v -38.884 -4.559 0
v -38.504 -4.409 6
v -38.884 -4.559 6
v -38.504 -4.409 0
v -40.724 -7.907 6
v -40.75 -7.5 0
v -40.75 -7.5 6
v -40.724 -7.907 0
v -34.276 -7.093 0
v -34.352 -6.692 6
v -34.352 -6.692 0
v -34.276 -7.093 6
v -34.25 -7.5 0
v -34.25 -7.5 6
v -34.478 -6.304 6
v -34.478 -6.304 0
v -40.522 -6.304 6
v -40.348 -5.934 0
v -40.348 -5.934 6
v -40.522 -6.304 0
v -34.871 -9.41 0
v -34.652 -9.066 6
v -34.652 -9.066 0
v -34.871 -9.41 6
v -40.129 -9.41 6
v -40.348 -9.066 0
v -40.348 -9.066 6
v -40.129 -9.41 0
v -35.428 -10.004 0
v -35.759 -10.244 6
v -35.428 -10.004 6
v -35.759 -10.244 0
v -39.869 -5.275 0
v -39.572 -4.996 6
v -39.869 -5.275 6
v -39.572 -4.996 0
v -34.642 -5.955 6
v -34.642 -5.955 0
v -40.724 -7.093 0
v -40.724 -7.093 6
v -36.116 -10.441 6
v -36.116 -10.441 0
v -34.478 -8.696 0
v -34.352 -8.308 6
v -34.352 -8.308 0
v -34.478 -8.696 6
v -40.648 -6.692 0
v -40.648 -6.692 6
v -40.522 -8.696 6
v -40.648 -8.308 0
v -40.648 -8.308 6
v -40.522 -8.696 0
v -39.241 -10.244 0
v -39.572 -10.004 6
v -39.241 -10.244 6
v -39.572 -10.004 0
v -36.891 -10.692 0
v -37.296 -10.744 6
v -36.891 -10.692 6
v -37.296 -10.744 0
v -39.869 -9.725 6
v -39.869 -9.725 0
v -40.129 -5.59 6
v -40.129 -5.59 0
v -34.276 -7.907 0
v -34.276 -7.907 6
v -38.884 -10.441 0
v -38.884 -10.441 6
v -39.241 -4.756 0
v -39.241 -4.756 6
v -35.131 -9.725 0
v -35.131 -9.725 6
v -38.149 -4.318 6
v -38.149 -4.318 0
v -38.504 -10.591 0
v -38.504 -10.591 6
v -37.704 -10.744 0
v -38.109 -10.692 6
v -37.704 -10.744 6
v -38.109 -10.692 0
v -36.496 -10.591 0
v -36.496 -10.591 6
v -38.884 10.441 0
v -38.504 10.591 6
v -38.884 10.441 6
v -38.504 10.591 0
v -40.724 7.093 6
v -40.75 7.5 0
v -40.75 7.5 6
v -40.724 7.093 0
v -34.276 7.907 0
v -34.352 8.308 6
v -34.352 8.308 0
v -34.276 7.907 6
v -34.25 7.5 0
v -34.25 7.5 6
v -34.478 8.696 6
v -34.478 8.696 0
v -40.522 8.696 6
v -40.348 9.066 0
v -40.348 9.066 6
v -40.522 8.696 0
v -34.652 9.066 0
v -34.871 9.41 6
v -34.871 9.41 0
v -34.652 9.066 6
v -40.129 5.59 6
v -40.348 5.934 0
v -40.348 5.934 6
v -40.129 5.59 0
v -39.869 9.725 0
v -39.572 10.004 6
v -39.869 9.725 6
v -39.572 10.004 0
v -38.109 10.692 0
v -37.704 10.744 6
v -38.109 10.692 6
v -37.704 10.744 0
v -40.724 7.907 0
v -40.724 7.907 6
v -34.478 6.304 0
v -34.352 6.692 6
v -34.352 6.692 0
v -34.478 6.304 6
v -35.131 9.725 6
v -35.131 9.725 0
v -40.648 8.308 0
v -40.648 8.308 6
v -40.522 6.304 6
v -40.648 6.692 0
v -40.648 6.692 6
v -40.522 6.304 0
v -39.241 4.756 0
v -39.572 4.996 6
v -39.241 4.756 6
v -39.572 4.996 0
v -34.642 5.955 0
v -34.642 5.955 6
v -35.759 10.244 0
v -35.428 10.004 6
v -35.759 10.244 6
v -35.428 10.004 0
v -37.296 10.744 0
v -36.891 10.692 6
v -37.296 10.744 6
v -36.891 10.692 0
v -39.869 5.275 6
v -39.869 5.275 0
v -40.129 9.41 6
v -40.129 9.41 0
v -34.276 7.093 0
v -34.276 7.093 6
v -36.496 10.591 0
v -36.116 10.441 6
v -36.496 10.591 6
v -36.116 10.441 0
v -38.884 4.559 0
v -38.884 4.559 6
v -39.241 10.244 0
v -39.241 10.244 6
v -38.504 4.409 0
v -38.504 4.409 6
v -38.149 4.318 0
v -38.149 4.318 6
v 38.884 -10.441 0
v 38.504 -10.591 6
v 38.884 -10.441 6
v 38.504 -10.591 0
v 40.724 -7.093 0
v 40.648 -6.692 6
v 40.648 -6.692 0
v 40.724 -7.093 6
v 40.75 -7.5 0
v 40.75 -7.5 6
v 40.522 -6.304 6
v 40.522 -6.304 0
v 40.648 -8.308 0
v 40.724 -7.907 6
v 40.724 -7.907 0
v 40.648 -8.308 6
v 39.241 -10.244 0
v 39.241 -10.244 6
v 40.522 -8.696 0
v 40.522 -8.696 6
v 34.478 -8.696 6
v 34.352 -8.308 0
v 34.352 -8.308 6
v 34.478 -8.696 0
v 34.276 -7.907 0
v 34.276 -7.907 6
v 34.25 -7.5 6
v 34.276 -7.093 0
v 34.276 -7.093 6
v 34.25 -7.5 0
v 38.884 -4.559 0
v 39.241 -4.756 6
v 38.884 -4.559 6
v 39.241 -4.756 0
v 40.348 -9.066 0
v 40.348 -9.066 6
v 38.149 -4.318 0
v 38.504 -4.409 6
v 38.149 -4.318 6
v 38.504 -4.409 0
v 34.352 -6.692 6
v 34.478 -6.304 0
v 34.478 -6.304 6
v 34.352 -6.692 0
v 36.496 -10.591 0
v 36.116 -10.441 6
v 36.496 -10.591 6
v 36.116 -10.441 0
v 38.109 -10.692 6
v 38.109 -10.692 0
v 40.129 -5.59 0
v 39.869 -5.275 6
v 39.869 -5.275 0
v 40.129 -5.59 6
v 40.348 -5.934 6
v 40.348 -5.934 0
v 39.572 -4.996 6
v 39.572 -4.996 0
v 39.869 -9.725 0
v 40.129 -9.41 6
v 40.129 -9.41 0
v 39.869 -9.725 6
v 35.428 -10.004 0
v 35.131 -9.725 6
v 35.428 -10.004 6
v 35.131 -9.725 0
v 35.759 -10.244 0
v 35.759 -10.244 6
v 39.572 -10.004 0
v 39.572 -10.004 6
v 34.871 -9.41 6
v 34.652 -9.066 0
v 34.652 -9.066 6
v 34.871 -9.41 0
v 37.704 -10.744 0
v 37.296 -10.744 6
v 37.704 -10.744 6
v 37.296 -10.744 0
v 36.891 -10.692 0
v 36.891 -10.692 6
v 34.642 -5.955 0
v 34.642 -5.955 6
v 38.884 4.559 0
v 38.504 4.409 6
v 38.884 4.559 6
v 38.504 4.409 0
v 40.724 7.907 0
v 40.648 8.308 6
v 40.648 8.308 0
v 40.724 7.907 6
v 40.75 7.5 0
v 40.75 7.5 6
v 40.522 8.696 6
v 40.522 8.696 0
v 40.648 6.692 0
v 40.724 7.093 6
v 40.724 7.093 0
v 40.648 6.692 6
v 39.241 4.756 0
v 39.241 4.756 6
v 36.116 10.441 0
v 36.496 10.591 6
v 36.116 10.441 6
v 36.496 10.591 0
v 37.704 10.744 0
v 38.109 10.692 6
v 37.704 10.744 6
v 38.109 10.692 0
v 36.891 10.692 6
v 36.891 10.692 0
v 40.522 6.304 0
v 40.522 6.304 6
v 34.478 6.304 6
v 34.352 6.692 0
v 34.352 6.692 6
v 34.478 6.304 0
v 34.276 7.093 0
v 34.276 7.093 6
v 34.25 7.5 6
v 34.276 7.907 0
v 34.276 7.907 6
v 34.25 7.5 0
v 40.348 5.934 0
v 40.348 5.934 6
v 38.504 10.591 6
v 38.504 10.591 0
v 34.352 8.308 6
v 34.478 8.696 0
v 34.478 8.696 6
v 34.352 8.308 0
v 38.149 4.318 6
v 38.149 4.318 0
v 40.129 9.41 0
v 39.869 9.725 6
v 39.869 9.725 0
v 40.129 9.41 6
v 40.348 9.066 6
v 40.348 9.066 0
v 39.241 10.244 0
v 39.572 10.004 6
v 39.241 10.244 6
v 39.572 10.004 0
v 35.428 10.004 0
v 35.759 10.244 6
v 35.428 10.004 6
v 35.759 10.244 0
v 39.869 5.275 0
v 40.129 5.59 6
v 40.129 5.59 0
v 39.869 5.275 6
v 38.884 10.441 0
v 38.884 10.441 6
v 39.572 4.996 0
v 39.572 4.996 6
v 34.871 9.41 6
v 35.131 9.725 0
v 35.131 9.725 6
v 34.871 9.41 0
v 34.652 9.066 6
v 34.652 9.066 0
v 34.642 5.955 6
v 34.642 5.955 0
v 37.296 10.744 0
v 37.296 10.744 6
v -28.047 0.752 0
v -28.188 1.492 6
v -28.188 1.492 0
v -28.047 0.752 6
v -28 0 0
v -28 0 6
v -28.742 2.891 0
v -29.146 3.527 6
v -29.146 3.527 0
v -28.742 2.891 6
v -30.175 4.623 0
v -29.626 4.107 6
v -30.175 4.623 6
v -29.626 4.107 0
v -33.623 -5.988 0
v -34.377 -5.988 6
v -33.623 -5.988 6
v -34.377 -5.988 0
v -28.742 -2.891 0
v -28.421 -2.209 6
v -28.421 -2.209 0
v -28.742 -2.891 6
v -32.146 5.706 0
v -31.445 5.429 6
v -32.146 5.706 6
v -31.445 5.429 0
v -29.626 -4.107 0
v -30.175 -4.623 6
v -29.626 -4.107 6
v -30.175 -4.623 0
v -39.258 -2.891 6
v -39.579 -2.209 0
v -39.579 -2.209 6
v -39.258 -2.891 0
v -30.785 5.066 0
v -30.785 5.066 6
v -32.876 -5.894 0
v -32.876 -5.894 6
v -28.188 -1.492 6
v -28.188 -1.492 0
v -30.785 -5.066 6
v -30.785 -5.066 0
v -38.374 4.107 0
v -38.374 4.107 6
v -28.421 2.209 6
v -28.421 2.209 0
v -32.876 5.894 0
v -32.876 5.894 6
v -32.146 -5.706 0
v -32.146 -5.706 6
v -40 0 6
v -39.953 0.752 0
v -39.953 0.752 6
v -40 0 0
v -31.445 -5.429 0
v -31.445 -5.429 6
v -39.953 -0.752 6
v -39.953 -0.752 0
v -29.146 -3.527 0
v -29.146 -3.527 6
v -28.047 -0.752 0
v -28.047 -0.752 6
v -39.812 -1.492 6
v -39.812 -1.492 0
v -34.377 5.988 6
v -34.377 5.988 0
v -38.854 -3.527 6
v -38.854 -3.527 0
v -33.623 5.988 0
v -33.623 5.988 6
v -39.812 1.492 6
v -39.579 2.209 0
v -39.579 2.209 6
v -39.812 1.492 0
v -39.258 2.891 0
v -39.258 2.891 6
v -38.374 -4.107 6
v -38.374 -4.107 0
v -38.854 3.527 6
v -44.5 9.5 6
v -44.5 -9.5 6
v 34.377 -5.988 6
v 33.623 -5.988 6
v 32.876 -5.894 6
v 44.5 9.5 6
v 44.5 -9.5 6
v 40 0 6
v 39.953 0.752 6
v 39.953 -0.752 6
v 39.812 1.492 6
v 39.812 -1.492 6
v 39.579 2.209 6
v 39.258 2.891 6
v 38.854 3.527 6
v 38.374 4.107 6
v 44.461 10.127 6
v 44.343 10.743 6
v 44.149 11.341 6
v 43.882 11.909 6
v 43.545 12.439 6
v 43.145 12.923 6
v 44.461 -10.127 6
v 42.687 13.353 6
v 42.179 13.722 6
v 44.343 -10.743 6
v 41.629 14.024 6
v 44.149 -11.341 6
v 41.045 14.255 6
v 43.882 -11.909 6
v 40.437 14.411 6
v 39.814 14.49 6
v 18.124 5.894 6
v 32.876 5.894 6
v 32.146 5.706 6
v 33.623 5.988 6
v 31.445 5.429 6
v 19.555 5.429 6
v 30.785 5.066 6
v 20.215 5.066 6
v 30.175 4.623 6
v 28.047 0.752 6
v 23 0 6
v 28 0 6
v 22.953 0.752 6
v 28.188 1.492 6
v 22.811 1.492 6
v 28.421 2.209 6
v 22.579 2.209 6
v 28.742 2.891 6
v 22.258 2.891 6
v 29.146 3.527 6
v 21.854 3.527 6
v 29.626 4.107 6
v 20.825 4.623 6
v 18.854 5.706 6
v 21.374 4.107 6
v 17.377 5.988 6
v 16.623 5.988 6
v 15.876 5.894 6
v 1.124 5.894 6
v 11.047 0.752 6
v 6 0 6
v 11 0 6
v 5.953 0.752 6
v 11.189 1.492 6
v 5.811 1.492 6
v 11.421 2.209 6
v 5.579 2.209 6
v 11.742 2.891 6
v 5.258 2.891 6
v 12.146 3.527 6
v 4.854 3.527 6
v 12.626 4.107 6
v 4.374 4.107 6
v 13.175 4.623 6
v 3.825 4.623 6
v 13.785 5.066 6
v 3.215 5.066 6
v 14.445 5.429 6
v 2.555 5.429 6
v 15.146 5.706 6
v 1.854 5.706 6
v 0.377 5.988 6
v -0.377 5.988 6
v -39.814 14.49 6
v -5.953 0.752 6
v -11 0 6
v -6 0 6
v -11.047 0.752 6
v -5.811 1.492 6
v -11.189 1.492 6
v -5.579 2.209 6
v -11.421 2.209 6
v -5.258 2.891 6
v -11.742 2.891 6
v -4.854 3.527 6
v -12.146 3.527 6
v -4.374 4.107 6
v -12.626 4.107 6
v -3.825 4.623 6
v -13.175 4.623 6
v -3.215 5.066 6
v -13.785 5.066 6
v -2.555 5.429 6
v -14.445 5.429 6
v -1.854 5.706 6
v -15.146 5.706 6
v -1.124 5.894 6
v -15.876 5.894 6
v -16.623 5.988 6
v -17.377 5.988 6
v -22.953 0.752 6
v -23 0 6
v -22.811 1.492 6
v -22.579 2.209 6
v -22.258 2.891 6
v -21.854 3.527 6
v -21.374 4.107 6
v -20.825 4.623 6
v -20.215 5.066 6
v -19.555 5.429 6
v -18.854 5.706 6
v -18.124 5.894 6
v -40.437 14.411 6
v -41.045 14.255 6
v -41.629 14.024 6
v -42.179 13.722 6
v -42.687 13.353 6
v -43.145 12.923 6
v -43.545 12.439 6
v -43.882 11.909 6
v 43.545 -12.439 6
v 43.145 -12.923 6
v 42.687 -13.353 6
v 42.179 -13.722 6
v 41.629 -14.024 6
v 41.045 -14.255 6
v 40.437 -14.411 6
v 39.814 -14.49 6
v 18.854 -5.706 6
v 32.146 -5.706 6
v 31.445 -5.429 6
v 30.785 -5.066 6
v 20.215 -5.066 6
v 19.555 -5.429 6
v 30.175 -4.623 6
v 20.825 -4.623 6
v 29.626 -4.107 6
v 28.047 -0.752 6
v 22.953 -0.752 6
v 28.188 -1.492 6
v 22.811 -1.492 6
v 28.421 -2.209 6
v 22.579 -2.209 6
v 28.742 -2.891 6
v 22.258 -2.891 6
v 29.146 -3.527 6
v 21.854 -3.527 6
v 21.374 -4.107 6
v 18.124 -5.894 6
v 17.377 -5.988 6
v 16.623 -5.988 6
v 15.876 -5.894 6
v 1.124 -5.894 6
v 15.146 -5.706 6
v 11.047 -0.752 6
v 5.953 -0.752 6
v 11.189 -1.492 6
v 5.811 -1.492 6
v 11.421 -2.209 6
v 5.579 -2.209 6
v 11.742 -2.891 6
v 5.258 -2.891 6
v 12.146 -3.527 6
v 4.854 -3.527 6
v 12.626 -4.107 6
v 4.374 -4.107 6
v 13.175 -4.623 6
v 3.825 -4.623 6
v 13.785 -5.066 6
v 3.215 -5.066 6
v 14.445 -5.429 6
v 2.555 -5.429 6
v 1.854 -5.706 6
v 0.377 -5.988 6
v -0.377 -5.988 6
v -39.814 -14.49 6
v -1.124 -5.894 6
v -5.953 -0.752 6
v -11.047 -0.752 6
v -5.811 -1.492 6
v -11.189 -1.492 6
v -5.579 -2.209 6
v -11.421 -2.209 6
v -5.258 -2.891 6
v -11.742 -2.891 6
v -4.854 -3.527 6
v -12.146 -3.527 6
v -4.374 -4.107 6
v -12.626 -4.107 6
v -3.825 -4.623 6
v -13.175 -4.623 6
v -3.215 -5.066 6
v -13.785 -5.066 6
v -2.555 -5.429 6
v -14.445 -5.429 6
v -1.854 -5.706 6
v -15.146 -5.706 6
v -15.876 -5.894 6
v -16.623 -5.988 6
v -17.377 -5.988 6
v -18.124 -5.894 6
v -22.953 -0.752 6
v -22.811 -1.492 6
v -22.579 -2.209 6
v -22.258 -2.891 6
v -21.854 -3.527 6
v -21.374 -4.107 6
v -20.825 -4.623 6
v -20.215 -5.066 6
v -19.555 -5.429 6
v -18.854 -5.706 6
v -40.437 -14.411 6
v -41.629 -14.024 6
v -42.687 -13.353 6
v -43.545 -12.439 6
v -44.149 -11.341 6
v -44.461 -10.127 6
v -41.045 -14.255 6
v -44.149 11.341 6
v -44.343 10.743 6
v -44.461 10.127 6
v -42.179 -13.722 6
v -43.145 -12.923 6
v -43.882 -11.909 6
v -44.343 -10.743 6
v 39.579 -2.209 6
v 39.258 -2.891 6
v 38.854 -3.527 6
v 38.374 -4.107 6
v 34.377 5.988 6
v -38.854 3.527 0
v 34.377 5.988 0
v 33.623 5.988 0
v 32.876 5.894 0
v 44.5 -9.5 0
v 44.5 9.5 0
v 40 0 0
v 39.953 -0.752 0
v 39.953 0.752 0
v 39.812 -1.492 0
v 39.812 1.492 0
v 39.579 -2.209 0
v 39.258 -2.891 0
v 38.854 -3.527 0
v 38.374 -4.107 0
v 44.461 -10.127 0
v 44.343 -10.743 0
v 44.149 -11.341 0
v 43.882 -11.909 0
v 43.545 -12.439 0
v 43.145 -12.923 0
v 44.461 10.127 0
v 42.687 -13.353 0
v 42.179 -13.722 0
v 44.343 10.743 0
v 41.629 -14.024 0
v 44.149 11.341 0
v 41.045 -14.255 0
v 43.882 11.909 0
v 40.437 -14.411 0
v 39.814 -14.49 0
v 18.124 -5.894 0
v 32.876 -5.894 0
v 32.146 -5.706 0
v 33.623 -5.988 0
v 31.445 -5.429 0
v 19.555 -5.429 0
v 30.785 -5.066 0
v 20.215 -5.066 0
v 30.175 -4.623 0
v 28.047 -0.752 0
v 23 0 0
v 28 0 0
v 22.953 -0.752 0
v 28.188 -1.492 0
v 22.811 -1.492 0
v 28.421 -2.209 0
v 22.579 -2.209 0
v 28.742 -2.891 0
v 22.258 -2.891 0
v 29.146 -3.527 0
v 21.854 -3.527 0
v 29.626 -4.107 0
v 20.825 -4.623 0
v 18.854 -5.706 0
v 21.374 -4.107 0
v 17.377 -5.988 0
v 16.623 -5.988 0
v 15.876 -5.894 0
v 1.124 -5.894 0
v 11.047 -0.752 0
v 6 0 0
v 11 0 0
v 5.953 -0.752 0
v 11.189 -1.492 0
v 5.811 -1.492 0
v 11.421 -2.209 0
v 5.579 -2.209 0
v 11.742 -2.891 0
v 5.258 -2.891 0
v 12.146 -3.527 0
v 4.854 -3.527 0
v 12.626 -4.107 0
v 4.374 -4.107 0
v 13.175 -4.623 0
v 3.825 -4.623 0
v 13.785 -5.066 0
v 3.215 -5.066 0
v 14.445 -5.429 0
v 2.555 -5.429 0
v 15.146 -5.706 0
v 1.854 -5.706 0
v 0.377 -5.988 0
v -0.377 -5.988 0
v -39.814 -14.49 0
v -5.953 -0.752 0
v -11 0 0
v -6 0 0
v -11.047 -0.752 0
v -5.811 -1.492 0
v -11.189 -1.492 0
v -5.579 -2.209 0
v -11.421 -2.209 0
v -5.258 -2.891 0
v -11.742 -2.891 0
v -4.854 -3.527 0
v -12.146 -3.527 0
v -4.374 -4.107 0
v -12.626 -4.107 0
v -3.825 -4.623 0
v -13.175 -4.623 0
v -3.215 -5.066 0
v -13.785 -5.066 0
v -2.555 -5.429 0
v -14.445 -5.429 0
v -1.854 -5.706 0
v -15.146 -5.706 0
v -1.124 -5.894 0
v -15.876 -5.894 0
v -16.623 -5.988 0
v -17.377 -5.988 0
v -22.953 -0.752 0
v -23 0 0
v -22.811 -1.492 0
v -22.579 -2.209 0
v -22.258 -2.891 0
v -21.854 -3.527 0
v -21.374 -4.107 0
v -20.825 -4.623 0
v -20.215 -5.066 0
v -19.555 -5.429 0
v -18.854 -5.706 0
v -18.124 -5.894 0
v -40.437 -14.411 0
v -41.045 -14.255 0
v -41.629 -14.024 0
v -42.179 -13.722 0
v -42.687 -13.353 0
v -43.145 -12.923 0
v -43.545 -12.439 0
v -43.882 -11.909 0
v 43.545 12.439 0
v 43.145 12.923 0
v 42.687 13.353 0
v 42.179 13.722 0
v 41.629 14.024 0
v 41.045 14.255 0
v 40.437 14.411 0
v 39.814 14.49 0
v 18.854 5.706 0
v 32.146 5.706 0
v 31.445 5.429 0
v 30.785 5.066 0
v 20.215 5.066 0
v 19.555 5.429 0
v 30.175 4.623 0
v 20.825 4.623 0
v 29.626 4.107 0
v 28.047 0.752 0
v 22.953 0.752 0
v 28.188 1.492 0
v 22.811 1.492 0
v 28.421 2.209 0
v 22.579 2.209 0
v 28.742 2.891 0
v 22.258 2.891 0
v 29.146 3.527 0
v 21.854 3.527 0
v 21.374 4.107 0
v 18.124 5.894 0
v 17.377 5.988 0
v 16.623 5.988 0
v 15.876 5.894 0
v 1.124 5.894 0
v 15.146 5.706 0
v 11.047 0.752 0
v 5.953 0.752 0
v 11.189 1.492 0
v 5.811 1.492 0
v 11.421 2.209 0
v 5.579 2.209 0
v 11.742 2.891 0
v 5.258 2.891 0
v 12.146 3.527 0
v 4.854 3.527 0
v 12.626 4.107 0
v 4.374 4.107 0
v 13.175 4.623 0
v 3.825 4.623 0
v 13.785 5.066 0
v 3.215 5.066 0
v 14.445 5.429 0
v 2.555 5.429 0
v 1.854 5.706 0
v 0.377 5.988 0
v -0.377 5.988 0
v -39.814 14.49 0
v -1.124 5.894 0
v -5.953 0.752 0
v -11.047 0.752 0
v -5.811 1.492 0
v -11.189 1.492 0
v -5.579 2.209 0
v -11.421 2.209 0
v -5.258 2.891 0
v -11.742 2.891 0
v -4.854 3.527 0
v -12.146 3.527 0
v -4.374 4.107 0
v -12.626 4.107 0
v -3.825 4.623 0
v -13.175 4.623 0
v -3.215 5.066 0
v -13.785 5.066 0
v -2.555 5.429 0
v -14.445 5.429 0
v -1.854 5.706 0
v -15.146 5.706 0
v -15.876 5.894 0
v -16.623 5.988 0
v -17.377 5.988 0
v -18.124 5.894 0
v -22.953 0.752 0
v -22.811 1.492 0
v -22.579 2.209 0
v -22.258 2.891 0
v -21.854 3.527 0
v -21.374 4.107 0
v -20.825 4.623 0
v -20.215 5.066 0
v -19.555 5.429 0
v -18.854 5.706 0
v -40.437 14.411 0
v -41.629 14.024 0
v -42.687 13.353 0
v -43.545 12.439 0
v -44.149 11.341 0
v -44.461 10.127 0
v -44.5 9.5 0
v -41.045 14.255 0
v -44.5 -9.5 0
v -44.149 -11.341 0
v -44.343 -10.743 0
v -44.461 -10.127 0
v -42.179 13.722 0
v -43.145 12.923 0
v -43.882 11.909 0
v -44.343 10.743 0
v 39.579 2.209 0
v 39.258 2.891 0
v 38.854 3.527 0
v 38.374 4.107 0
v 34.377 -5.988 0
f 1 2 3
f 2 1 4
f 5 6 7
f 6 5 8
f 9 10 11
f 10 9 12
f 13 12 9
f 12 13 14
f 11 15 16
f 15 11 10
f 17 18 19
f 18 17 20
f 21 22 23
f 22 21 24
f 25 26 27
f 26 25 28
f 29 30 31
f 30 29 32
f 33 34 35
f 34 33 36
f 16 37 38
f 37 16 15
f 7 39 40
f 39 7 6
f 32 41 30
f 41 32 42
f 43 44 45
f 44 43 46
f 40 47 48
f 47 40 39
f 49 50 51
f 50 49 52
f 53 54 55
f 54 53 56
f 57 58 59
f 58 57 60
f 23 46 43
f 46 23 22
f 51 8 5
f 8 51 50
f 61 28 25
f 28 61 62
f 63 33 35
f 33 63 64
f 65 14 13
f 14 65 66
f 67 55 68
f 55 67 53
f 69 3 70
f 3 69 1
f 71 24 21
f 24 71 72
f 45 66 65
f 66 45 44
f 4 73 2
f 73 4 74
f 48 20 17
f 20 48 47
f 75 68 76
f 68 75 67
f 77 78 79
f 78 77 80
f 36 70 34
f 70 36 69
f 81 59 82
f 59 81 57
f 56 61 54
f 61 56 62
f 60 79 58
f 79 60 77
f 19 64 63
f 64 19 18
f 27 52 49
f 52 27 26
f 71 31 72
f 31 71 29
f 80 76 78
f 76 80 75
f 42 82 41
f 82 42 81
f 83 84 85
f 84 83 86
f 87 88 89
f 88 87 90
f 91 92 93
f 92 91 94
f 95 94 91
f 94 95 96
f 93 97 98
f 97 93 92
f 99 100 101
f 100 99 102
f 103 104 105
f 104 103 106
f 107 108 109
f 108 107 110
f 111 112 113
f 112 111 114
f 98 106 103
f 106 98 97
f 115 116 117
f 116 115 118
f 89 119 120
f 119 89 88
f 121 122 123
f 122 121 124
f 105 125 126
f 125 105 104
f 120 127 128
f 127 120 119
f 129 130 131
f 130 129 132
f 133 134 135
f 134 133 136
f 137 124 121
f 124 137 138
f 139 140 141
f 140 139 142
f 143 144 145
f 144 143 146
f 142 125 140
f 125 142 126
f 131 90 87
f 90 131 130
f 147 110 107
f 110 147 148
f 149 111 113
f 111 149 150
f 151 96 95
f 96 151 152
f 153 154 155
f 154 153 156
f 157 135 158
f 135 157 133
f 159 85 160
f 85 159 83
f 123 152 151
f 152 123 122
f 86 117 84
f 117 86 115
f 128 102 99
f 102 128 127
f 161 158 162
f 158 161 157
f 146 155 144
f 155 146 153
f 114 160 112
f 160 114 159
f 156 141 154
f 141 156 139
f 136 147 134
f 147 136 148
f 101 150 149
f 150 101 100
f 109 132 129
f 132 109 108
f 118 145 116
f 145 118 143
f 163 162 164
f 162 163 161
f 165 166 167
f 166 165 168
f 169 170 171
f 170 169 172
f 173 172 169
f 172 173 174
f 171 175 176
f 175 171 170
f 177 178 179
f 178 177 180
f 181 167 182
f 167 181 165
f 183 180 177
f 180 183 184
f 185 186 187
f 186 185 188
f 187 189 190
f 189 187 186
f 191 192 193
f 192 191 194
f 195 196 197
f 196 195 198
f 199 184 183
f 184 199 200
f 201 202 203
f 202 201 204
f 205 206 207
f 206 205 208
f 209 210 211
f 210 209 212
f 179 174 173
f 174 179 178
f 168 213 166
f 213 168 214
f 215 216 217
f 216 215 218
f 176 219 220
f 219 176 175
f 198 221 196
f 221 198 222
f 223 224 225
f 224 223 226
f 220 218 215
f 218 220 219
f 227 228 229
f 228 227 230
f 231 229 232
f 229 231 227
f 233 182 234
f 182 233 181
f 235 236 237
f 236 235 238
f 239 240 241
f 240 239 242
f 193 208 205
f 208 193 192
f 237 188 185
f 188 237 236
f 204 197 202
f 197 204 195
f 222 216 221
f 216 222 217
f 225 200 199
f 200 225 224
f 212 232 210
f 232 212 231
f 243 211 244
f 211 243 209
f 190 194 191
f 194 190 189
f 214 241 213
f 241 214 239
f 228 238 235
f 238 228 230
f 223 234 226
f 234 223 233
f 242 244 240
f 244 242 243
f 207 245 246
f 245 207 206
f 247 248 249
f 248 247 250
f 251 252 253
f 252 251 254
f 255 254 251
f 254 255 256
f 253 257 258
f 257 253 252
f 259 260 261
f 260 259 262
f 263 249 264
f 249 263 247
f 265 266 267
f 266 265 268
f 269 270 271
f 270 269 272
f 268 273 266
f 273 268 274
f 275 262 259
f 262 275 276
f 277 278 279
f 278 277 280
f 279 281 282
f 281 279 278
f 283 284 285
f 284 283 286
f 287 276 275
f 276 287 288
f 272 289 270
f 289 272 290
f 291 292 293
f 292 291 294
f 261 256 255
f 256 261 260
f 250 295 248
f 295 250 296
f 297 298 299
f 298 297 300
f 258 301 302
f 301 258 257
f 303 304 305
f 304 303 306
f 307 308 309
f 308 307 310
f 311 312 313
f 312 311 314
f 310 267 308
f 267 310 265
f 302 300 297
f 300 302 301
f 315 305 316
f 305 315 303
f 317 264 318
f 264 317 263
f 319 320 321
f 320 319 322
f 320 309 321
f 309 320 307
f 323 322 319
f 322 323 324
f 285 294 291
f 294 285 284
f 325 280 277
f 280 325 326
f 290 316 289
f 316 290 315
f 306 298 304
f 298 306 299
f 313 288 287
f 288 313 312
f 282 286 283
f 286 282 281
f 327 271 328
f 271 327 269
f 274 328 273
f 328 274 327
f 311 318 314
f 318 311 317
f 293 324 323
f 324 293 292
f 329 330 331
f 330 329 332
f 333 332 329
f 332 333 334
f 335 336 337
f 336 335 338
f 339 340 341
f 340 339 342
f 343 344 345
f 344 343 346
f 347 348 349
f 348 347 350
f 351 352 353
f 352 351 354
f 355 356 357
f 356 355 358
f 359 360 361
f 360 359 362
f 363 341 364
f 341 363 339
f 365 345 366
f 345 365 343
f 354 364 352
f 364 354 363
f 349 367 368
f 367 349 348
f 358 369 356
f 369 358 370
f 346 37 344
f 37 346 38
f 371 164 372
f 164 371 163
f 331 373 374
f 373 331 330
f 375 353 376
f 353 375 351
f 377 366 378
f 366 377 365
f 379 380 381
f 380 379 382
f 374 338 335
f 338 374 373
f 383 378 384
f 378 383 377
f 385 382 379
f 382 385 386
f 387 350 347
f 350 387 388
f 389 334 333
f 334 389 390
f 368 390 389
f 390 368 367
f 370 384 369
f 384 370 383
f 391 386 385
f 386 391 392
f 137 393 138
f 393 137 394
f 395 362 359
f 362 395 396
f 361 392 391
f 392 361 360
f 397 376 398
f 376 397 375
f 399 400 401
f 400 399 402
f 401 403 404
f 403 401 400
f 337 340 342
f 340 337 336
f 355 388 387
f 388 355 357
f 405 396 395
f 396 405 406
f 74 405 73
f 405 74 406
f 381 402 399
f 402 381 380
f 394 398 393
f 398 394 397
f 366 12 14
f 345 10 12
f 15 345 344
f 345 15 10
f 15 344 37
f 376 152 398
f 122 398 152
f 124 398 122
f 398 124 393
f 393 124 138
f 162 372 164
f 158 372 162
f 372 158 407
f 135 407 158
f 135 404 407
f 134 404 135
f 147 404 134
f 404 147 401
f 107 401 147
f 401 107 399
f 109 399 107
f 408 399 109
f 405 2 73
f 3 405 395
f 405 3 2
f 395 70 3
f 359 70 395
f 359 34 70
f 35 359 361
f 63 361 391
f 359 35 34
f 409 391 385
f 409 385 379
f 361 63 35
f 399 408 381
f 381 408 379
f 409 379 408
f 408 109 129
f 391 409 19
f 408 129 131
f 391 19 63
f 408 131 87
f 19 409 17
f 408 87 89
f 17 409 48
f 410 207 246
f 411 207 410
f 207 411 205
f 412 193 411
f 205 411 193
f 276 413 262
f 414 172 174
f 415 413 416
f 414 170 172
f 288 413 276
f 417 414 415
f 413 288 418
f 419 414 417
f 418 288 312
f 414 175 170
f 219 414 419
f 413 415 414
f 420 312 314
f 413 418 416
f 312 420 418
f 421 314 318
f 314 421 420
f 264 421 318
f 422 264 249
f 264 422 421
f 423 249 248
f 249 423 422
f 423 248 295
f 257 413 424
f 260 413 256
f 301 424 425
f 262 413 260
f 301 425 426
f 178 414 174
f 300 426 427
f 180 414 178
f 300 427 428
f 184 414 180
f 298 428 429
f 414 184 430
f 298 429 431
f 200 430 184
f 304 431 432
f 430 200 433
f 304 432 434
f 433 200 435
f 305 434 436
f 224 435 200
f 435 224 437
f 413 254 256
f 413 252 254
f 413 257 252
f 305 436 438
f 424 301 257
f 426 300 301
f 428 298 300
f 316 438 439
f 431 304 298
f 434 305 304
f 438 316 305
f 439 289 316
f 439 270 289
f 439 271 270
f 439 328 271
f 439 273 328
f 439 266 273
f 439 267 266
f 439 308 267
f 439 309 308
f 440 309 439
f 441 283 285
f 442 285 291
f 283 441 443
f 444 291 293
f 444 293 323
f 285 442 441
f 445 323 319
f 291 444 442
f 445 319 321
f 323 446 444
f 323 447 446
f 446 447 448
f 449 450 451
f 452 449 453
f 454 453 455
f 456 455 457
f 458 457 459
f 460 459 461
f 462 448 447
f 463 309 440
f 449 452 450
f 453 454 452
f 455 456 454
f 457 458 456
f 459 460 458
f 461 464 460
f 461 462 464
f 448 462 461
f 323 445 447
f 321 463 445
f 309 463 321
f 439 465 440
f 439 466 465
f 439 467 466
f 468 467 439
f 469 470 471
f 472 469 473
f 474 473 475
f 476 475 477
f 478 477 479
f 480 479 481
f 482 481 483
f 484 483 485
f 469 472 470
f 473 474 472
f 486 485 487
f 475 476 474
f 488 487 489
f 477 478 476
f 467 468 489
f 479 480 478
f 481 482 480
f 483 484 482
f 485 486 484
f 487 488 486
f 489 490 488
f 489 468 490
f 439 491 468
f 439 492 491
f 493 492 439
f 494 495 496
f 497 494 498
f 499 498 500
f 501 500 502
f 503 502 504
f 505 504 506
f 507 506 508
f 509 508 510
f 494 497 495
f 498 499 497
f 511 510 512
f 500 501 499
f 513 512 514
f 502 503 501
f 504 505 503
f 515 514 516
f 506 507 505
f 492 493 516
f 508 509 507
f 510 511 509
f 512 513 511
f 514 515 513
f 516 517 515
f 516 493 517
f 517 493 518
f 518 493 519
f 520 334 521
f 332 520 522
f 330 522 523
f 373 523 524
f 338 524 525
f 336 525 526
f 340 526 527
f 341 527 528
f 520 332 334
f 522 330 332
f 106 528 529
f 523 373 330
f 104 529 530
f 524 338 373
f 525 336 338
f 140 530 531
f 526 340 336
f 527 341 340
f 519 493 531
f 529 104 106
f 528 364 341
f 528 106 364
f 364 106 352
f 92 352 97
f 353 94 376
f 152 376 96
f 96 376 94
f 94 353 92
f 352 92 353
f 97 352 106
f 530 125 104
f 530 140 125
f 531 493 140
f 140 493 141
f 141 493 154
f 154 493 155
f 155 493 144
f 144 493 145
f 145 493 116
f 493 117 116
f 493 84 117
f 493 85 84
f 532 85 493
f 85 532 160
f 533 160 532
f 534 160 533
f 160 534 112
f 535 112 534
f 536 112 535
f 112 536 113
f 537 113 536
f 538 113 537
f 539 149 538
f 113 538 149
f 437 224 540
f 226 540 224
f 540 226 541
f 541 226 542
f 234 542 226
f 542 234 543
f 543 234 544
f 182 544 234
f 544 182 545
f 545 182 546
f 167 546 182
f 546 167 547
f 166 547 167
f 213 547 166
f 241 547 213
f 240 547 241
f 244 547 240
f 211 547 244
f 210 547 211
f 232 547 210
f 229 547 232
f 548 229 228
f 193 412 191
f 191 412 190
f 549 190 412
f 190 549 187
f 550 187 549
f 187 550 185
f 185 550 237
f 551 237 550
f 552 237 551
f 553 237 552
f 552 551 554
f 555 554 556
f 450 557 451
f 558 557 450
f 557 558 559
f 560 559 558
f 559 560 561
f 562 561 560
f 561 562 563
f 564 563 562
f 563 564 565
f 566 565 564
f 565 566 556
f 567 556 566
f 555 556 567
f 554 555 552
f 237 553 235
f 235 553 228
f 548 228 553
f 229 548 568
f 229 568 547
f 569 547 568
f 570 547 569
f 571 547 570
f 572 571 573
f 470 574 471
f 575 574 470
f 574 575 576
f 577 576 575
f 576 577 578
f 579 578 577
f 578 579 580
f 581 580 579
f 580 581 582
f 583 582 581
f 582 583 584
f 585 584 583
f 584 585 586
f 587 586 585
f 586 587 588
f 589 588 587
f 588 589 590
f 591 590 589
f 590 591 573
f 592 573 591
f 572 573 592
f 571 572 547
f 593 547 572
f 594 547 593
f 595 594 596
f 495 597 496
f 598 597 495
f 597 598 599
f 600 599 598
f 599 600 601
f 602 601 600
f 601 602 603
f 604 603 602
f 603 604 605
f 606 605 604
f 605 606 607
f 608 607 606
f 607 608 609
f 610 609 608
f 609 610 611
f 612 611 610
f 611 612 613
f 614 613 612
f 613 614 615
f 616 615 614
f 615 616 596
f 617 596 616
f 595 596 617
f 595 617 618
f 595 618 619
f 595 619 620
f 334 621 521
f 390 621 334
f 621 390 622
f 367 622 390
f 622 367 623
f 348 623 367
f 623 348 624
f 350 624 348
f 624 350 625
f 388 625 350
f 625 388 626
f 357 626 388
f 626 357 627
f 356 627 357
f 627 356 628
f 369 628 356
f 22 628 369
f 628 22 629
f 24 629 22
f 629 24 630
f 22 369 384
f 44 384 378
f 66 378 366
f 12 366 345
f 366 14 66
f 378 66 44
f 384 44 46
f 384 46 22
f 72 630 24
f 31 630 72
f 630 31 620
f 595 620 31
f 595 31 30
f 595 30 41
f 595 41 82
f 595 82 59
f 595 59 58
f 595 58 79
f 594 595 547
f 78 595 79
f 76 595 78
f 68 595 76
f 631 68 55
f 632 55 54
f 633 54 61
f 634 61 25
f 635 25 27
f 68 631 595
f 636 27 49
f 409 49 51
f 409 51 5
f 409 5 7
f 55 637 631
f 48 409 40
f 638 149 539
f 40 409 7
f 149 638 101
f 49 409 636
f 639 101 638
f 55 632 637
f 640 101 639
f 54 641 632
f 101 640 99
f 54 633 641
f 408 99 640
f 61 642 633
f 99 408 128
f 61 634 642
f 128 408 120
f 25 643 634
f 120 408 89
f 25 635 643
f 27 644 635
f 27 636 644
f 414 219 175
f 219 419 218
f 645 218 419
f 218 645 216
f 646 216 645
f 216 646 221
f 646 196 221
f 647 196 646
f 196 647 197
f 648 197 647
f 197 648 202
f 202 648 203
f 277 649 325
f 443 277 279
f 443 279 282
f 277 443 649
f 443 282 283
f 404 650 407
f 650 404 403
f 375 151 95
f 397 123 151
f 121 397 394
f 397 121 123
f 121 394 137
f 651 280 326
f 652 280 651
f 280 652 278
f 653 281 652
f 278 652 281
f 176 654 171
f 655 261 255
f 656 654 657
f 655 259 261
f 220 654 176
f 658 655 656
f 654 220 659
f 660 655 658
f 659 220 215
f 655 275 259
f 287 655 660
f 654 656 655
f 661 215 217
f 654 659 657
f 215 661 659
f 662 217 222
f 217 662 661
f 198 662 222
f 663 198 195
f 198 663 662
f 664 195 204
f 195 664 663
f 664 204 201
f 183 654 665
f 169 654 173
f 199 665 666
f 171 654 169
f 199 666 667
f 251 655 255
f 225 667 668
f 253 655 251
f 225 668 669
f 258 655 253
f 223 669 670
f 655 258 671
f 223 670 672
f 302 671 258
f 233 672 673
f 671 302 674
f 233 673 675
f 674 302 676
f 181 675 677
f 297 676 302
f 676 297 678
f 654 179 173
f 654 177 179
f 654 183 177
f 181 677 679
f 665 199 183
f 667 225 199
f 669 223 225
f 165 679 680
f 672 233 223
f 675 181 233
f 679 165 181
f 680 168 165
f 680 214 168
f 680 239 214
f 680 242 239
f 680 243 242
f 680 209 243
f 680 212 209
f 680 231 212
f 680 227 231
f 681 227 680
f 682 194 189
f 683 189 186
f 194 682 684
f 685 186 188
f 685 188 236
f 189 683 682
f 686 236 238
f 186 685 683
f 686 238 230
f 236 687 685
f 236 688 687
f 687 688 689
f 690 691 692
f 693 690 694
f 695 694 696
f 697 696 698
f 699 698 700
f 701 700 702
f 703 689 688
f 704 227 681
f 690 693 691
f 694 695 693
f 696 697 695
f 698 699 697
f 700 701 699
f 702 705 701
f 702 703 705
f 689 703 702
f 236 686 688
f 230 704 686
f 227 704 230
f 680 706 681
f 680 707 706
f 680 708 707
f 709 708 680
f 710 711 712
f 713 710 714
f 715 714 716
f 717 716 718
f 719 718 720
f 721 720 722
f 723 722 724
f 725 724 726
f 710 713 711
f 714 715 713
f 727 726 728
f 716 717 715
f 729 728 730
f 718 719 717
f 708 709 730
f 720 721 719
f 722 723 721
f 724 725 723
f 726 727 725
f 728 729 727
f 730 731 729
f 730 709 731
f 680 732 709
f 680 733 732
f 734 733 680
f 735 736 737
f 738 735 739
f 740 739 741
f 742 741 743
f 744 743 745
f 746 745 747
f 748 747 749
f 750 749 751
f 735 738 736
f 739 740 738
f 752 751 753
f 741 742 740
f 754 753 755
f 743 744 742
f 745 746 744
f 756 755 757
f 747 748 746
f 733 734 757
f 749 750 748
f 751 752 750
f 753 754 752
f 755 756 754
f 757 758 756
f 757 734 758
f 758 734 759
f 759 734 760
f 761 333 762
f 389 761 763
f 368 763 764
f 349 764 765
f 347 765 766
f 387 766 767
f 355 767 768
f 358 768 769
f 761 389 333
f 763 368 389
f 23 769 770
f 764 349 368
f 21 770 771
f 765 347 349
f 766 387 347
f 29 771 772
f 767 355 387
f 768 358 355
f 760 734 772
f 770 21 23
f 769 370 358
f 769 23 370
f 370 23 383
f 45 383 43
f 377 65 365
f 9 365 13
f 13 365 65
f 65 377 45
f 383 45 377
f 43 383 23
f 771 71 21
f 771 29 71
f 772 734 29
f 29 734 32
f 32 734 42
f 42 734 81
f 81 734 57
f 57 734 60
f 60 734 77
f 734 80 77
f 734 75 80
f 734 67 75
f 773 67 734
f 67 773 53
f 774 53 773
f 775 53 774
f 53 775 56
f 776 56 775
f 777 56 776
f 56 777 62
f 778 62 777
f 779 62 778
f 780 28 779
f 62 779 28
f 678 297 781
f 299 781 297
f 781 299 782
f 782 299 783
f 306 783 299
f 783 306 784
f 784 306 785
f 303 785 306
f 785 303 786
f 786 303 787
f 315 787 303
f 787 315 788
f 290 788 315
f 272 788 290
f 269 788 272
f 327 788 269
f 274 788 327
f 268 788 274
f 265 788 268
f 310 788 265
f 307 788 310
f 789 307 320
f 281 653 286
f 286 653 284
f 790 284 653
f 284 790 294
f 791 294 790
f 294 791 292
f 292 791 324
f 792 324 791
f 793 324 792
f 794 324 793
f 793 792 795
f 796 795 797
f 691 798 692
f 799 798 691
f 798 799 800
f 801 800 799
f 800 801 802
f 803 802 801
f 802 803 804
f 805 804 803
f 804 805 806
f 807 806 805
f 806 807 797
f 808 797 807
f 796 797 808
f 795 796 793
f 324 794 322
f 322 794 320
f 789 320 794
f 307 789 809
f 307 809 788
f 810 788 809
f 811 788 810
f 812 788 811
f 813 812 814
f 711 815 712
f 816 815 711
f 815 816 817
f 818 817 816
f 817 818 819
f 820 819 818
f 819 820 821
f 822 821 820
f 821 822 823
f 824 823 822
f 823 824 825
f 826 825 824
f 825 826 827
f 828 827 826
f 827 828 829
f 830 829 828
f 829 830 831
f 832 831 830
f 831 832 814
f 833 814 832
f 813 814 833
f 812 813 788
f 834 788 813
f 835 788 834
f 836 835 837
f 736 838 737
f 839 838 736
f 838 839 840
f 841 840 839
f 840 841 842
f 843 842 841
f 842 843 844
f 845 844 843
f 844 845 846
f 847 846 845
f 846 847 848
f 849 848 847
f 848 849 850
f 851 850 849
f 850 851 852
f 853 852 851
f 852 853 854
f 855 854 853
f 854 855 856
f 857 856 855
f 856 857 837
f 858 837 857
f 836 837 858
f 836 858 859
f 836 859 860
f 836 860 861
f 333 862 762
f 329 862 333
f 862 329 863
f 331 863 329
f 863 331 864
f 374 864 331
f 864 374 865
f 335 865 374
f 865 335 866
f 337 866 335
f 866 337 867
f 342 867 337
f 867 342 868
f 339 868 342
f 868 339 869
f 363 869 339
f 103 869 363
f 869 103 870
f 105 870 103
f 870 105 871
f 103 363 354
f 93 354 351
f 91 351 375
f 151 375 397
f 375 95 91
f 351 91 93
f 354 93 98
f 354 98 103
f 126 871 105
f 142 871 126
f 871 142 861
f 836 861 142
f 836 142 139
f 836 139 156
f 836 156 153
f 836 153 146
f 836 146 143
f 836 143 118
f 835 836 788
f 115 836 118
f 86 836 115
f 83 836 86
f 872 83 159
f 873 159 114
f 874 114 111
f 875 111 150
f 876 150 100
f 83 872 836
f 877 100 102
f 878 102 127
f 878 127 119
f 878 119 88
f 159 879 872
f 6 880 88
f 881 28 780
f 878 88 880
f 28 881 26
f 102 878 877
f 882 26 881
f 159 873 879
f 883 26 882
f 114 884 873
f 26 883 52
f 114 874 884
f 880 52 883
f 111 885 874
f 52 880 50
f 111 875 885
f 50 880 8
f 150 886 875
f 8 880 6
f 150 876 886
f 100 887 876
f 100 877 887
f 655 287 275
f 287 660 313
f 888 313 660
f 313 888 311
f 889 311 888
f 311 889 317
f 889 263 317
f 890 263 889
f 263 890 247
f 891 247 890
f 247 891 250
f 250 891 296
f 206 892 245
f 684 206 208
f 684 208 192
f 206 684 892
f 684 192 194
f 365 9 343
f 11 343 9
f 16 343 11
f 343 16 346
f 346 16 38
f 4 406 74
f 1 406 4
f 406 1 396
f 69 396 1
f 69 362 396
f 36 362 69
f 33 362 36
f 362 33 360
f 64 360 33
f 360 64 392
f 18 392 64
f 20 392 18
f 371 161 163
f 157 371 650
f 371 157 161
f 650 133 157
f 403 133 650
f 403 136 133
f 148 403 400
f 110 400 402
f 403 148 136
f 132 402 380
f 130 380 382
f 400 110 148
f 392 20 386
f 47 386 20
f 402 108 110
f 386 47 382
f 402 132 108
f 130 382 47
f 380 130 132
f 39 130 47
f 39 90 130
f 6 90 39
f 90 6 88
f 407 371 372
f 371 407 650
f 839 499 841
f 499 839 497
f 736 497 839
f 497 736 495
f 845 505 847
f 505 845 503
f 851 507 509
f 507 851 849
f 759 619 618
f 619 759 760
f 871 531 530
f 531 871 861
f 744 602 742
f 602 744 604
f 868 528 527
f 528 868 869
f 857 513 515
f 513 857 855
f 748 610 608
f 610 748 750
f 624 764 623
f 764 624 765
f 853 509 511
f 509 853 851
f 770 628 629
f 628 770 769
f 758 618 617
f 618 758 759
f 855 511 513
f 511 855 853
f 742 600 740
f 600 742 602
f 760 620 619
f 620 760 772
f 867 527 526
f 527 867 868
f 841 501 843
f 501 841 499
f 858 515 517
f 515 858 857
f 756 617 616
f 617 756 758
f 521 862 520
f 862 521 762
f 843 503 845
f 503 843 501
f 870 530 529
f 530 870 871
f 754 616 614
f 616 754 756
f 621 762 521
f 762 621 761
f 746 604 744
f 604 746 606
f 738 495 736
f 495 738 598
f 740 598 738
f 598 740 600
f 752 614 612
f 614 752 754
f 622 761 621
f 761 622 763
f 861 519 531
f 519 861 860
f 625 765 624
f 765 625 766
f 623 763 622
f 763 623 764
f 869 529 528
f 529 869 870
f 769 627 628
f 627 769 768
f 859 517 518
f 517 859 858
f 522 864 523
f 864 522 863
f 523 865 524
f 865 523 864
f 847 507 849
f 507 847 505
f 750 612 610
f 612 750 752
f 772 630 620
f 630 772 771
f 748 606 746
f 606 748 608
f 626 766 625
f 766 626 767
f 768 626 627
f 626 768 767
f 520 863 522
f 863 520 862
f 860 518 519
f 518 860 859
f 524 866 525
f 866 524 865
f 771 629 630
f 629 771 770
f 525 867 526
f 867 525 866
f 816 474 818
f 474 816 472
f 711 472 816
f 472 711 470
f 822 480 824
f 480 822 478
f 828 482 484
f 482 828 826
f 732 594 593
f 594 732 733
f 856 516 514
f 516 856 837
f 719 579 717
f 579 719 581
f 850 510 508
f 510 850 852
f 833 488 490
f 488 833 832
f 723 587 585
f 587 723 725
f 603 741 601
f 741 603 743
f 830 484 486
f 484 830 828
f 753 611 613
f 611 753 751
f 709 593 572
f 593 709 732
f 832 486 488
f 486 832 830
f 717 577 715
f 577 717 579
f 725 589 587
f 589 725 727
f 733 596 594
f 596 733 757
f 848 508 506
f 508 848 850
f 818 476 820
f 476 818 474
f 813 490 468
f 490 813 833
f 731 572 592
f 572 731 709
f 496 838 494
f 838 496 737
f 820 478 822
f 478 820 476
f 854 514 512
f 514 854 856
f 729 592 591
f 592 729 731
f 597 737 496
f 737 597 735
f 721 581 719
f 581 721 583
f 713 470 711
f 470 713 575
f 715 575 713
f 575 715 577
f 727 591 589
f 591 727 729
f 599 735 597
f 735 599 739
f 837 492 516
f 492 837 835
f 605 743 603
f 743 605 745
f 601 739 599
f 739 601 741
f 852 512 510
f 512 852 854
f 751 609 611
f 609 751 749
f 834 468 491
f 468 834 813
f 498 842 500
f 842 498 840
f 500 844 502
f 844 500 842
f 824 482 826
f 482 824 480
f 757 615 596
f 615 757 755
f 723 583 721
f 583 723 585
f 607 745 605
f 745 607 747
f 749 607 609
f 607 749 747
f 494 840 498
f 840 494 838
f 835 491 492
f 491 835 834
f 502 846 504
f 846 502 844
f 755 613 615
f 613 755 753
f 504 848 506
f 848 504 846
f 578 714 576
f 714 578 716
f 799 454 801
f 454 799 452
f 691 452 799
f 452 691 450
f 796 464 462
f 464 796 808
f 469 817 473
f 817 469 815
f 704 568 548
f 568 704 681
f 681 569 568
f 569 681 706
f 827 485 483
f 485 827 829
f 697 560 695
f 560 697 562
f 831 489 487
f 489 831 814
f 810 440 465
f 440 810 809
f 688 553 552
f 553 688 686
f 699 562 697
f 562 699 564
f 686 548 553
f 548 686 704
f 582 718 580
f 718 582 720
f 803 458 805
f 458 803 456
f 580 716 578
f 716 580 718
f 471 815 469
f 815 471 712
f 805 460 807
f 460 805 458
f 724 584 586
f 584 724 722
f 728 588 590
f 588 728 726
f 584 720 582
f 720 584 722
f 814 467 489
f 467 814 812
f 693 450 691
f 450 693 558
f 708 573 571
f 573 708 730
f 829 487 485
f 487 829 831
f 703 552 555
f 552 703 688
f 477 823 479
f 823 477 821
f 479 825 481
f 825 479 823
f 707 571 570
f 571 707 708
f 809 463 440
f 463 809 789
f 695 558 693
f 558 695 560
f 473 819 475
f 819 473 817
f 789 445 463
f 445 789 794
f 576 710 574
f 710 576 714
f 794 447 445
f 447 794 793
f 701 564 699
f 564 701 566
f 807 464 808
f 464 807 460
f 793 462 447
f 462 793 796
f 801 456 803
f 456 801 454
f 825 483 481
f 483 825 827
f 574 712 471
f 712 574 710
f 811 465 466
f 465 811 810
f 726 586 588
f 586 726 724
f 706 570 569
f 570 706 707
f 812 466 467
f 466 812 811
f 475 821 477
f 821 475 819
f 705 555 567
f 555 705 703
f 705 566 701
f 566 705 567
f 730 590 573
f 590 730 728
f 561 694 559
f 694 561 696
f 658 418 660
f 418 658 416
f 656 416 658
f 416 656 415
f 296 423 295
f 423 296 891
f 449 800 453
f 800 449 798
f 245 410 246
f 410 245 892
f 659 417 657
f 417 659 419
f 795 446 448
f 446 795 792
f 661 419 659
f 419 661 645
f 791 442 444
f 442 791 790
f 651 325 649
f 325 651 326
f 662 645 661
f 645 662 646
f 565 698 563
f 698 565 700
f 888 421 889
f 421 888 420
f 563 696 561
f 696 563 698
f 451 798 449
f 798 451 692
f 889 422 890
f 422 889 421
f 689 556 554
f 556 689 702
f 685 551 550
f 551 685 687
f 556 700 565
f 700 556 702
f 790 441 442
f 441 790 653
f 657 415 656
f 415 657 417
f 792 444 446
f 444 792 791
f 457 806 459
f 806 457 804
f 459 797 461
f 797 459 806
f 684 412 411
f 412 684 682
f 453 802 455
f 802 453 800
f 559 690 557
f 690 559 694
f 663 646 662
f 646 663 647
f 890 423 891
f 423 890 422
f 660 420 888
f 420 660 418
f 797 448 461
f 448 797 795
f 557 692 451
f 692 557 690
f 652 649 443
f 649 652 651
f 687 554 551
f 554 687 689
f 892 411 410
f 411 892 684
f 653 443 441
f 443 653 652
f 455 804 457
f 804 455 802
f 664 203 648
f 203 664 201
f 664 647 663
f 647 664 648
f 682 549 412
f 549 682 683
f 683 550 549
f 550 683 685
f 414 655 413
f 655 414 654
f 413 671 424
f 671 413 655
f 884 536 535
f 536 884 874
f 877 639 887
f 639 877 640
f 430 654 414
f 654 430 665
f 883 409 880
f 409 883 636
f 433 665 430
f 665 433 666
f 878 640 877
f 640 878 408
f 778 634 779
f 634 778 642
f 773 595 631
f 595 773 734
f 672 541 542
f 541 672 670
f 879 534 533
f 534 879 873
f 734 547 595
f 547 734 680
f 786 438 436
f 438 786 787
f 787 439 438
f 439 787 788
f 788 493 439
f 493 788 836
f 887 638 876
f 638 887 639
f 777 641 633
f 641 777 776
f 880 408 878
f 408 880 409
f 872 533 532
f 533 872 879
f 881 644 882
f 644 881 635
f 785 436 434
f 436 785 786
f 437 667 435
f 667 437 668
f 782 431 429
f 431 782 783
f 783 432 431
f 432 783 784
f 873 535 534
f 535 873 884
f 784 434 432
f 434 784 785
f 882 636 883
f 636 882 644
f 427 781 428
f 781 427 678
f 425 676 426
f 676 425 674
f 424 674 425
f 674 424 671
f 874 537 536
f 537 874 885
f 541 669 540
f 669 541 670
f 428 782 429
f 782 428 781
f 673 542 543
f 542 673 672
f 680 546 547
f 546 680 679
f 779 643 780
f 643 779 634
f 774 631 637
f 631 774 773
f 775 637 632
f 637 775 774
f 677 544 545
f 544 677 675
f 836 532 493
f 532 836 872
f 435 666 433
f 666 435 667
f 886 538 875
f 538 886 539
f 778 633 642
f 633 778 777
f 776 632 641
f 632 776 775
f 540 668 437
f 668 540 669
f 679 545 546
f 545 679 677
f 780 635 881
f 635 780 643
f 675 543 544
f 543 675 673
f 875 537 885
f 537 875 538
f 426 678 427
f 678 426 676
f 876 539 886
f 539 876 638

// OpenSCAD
$fn = 50;

difference() {
	union() {
		hull() {
			translate(v = [-39.5, 9.5, 0]) {
				cylinder(h = 6, r = 5);
			}
			translate(v = [39.5, 9.5, 0]) {
				cylinder(h = 6, r = 5);
			}
			translate(v = [-39.5, -9.5, 0]) {
				cylinder(h = 6, r = 5);
			}
			translate(v = [39.5, -9.5, 0]) {
				cylinder(h = 6, r = 5);
			}
		}
	}
	union() {
		translate(v = [-37.5, -7.5, -100.0]) {
			cylinder(h = 200, r = 3.25);
		}
		translate(v = [-37.5, 7.5, -100.0]) {
			cylinder(h = 200, r = 3.25);
		}
		translate(v = [37.5, -7.5, -100.0]) {
			cylinder(h = 200, r = 3.25);
		}
		translate(v = [37.5, 7.5, -100.0]) {
			cylinder(h = 200, r = 3.25);
		}
		translate(v = [-37.5, -7.5, -100.0]) {
			cylinder(h = 200, r = 1.8);
		}
		translate(v = [-37.5, 7.5, -100.0]) {
			cylinder(h = 200, r = 1.8);
		}
		translate(v = [37.5, -7.5, -100.0]) {
			cylinder(h = 200, r = 1.8);
		}
		translate(v = [37.5, 7.5, -100.0]) {
			cylinder(h = 200, r = 1.8);
		}
		translate(v = [-34.0, 0, 0.0]) {
			cylinder(h = 6, r = 6.0);
		}
		translate(v = [-17.0, 0, 0.0]) {
			cylinder(h = 6, r = 6.0);
		}
		cylinder(h = 6, r = 6.0);
		translate(v = [17.0, 0, 0.0]) {
			cylinder(h = 6, r = 6.0);
		}
		translate(v = [34.0, 0, 0.0]) {
			cylinder(h = 6, r = 6.0);
		}
	}
}
